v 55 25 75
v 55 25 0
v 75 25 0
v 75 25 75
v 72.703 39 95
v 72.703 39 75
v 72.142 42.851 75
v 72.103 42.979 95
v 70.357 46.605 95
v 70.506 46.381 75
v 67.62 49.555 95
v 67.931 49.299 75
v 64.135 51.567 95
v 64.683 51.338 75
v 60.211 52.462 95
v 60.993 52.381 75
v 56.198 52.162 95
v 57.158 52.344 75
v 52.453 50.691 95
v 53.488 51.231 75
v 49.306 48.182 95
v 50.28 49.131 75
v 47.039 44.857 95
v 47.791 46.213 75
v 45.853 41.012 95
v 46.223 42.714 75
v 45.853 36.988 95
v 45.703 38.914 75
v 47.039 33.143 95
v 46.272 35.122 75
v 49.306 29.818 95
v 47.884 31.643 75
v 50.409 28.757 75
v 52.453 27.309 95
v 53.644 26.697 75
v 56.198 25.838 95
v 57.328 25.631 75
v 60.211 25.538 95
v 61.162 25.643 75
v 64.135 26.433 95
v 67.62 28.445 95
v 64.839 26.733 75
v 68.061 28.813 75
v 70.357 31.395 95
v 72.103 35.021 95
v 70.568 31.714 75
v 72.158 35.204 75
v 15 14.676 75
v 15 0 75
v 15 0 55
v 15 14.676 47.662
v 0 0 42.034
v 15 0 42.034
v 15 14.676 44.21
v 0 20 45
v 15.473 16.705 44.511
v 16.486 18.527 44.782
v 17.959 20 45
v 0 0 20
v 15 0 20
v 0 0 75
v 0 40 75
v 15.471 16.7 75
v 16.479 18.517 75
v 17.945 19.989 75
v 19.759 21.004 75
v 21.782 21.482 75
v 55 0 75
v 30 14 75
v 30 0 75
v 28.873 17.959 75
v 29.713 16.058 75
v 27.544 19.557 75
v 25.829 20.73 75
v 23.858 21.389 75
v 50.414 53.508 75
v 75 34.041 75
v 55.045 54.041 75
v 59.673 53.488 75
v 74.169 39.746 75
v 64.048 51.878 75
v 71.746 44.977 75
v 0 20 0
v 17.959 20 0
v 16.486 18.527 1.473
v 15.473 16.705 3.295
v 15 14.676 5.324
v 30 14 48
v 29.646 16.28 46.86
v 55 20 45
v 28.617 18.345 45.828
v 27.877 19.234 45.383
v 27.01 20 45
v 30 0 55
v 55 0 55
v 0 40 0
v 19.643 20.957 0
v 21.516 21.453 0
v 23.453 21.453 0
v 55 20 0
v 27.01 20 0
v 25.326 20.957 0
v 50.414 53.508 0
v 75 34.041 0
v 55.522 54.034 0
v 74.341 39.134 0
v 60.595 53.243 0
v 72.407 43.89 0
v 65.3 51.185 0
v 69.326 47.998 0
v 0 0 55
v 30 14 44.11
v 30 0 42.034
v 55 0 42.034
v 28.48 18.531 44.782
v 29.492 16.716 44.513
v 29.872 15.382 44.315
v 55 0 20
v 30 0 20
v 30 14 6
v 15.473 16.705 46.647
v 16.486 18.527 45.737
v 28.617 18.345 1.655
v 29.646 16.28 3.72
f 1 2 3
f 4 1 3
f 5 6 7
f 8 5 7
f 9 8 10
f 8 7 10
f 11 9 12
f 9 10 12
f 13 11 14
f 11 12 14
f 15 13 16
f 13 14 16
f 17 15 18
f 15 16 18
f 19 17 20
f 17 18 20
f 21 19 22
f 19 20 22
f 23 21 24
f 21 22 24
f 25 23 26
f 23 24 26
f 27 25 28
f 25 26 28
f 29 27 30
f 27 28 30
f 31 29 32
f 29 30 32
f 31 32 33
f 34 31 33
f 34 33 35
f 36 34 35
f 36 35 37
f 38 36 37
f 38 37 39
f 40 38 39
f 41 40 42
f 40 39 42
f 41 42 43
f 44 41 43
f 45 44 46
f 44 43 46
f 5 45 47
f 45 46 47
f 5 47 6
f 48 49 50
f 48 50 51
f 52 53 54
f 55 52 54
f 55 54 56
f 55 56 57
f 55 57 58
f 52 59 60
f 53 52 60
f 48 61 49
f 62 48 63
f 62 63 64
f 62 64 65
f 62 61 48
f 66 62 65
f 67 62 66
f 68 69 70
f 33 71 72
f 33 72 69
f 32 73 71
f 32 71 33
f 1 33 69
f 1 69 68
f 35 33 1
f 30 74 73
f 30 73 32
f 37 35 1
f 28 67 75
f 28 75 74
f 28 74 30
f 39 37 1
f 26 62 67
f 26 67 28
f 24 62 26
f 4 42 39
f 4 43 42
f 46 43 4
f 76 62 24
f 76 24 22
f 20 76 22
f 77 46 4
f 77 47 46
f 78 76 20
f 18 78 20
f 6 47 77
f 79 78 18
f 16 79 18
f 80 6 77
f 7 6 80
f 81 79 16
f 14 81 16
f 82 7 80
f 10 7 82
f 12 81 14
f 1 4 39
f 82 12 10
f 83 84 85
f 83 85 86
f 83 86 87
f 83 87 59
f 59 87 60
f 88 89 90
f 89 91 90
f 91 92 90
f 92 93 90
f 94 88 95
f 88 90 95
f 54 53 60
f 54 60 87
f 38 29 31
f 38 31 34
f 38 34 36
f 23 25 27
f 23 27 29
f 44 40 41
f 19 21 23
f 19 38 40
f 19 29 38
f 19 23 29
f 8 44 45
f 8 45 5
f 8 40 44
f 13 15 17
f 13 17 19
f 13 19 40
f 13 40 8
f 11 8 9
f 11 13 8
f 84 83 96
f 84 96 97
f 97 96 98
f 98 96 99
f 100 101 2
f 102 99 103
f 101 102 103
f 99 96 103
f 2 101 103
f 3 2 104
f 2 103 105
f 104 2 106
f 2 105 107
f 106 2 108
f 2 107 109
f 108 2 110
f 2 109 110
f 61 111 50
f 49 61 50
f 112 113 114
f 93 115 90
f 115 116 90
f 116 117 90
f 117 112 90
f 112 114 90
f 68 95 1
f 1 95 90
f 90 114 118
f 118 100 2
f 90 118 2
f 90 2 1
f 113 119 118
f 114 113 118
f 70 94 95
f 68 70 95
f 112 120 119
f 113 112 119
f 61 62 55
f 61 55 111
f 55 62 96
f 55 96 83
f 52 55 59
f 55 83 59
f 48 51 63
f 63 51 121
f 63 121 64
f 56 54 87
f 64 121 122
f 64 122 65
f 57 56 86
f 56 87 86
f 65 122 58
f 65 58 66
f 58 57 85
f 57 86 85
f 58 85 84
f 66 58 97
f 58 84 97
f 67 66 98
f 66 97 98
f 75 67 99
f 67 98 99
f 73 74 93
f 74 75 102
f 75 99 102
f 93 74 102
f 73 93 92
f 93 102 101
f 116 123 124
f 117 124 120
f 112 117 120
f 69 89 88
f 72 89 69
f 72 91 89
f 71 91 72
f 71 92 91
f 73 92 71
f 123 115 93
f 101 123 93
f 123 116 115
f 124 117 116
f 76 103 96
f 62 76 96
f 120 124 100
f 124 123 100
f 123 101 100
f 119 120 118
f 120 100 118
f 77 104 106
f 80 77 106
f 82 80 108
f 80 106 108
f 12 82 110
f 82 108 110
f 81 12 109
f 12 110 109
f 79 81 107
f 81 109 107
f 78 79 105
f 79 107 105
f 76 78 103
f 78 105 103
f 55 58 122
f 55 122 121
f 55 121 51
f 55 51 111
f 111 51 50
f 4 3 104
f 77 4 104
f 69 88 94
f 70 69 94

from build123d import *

# Parameters (mm, degrees)
F1_DEPTH = 75
F2_R     = 13.5
F3_DEPTH = 20
F5_DEPTH = 55.001
F7_DEPTH = 55.001


with BuildPart() as f1:
    # F0 (on Top) → F1 (new body)
    with BuildSketch(Plane.XY):
        with BuildLine():
            Line((0, 40), (0, 0))
            Line((0, 0), (15, 0))
            Line((15, 0), (15, 14.675536))
            ThreePointArc((15, 14.675536), (22.822899, 21.507602), (30, 14))
            Line((30, 14), (30, 0))
            Line((30, 0), (55, 0))
            Line((55, 0), (55, 25))
            Line((55, 25), (75, 25))
            Line((75, 25), (75, 34.041284))
            ThreePointArc((75, 34.041284), (67.415432, 49.721114), (50.414294, 53.508469))
            Line((50.414294, 53.508469), (0, 40))
        make_face()
    extrude(amount=F1_DEPTH)

    # F2 (on face) → F3 (join)
    with BuildSketch(Plane.XY.offset(75)):
        with Locations((59.202516, 39)):
            Circle(F2_R)
    extrude(amount=F3_DEPTH)

    # F4 (on face) → F5 (cut, through all)
    with BuildSketch(Plane.YZ.offset(55)):
        Polygon((20, 45), (0, 55), (0, 42.03419), align=None)
    extrude(amount=-F5_DEPTH, mode=Mode.SUBTRACT)

    # F6 (on face) → F7 (cut, through all)
    with BuildSketch(Plane.YZ.offset(55)):
        Polygon((20, 0), (0, 20), (0, 0), align=None)
    extrude(amount=-F7_DEPTH, mode=Mode.SUBTRACT)


solid = f1.part
